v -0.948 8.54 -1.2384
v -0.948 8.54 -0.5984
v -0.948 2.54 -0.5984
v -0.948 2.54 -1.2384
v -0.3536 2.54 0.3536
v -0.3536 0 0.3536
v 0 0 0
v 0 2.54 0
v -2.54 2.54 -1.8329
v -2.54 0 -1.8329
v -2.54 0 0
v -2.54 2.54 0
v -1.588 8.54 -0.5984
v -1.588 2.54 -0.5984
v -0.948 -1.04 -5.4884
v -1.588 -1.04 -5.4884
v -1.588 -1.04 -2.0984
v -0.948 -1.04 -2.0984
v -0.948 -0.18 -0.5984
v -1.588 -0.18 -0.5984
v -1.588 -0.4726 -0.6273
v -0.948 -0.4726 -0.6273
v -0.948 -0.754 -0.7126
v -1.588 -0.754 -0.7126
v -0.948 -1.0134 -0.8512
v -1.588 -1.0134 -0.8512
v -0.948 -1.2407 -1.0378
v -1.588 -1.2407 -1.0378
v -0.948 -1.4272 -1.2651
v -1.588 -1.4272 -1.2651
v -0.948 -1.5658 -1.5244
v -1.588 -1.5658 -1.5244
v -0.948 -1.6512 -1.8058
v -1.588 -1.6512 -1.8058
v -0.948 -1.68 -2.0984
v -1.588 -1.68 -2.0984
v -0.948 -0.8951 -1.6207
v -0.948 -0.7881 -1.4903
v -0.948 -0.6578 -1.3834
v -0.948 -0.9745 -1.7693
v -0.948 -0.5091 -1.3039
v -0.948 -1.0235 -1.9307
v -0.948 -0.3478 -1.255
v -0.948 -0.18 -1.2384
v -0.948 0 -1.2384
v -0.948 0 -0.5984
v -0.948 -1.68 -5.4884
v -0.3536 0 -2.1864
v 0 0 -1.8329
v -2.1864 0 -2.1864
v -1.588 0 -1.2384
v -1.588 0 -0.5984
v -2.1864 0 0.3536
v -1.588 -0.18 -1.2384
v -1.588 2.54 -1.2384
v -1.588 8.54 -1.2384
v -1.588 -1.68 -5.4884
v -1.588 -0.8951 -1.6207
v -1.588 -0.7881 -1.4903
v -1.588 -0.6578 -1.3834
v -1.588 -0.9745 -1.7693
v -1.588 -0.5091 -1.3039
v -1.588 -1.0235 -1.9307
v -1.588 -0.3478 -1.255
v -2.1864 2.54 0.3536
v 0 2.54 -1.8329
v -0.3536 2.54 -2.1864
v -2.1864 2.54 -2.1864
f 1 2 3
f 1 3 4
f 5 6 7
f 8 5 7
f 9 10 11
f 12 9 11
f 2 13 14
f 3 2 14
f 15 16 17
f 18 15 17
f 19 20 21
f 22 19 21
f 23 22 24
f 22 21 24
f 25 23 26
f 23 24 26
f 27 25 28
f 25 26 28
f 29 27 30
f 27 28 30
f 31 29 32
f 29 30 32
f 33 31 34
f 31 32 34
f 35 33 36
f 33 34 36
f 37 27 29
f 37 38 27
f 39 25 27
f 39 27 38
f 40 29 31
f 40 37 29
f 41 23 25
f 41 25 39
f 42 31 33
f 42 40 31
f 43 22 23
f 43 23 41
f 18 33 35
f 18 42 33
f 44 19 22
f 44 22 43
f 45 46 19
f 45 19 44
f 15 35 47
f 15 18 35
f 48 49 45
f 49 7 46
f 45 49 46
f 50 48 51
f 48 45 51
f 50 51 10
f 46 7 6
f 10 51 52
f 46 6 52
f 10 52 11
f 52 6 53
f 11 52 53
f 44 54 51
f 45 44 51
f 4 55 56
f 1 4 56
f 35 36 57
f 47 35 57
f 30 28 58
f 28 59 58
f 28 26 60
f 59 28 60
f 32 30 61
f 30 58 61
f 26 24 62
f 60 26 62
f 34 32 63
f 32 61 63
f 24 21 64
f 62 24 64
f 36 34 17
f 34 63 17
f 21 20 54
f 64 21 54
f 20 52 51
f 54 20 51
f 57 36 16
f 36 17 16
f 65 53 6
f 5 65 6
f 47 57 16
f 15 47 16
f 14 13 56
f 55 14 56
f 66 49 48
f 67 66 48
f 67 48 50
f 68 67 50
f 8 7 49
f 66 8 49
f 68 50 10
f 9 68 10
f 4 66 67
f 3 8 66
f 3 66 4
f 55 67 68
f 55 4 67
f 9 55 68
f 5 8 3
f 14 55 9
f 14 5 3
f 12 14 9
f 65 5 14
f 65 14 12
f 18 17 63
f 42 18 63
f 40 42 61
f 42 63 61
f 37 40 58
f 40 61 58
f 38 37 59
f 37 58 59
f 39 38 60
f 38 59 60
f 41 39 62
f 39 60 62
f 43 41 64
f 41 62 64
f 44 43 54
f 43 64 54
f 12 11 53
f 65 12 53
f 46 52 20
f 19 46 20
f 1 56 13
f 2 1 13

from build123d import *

# Parameters (mm, degrees)
SKETCH1_W           = 0.636
SKETCH1_H           = 0.636
BOSS_EXTRUDE1_DEPTH = 2.54
BOSS_EXTRU_1_DEPTH  = 0.64


with BuildPart() as part:
    # Sketch1 → Boss-Extrude1 (new body)
    with BuildSketch(Plane.XZ):
        Polygon((-0.353553391, -2.186446609), (-2.186446609, -2.186446609), (-2.54, -1.832893219), (-2.54, 0), (-2.186446609, 0.353553391), (-0.353553391, 0.353553391), (0, 0), (0, -1.832893219), align=None)
        with Locations((-1.27, -0.916446609)):
            Rectangle(SKETCH1_W, SKETCH1_H, mode=Mode.SUBTRACT)
    extrude(amount=-BOSS_EXTRUDE1_DEPTH)

    # Esquisse1 → Boss.-Extru.1 (add)
    with BuildSketch(Plane(origin=(-1.588, 0, 0), x_dir=(0, 0, -1), z_dir=(1, 0, 0))):
        with BuildLine():
            Line((0.598446609, 8.54), (0.598446609, -0.18))
            ThreePointArc((0.598446609, -0.18), (1.037786438, -1.240660172), (2.098446609, -1.68))
            Line((2.098446609, -1.68), (5.488446609, -1.68))
            Line((5.488446609, -1.68), (5.488446609, -1.04))
            Line((5.488446609, -1.04), (2.098446609, -1.04))
            ThreePointArc((2.098446609, -1.04), (1.490334778, -0.788111832), (1.238446609, -0.18))
            Line((1.238446609, -0.18), (1.238446609, 8.54))
            Line((1.238446609, 8.54), (0.598446609, 8.54))
        make_face()
    extrude(amount=BOSS_EXTRU_1_DEPTH)


solid = part.part
